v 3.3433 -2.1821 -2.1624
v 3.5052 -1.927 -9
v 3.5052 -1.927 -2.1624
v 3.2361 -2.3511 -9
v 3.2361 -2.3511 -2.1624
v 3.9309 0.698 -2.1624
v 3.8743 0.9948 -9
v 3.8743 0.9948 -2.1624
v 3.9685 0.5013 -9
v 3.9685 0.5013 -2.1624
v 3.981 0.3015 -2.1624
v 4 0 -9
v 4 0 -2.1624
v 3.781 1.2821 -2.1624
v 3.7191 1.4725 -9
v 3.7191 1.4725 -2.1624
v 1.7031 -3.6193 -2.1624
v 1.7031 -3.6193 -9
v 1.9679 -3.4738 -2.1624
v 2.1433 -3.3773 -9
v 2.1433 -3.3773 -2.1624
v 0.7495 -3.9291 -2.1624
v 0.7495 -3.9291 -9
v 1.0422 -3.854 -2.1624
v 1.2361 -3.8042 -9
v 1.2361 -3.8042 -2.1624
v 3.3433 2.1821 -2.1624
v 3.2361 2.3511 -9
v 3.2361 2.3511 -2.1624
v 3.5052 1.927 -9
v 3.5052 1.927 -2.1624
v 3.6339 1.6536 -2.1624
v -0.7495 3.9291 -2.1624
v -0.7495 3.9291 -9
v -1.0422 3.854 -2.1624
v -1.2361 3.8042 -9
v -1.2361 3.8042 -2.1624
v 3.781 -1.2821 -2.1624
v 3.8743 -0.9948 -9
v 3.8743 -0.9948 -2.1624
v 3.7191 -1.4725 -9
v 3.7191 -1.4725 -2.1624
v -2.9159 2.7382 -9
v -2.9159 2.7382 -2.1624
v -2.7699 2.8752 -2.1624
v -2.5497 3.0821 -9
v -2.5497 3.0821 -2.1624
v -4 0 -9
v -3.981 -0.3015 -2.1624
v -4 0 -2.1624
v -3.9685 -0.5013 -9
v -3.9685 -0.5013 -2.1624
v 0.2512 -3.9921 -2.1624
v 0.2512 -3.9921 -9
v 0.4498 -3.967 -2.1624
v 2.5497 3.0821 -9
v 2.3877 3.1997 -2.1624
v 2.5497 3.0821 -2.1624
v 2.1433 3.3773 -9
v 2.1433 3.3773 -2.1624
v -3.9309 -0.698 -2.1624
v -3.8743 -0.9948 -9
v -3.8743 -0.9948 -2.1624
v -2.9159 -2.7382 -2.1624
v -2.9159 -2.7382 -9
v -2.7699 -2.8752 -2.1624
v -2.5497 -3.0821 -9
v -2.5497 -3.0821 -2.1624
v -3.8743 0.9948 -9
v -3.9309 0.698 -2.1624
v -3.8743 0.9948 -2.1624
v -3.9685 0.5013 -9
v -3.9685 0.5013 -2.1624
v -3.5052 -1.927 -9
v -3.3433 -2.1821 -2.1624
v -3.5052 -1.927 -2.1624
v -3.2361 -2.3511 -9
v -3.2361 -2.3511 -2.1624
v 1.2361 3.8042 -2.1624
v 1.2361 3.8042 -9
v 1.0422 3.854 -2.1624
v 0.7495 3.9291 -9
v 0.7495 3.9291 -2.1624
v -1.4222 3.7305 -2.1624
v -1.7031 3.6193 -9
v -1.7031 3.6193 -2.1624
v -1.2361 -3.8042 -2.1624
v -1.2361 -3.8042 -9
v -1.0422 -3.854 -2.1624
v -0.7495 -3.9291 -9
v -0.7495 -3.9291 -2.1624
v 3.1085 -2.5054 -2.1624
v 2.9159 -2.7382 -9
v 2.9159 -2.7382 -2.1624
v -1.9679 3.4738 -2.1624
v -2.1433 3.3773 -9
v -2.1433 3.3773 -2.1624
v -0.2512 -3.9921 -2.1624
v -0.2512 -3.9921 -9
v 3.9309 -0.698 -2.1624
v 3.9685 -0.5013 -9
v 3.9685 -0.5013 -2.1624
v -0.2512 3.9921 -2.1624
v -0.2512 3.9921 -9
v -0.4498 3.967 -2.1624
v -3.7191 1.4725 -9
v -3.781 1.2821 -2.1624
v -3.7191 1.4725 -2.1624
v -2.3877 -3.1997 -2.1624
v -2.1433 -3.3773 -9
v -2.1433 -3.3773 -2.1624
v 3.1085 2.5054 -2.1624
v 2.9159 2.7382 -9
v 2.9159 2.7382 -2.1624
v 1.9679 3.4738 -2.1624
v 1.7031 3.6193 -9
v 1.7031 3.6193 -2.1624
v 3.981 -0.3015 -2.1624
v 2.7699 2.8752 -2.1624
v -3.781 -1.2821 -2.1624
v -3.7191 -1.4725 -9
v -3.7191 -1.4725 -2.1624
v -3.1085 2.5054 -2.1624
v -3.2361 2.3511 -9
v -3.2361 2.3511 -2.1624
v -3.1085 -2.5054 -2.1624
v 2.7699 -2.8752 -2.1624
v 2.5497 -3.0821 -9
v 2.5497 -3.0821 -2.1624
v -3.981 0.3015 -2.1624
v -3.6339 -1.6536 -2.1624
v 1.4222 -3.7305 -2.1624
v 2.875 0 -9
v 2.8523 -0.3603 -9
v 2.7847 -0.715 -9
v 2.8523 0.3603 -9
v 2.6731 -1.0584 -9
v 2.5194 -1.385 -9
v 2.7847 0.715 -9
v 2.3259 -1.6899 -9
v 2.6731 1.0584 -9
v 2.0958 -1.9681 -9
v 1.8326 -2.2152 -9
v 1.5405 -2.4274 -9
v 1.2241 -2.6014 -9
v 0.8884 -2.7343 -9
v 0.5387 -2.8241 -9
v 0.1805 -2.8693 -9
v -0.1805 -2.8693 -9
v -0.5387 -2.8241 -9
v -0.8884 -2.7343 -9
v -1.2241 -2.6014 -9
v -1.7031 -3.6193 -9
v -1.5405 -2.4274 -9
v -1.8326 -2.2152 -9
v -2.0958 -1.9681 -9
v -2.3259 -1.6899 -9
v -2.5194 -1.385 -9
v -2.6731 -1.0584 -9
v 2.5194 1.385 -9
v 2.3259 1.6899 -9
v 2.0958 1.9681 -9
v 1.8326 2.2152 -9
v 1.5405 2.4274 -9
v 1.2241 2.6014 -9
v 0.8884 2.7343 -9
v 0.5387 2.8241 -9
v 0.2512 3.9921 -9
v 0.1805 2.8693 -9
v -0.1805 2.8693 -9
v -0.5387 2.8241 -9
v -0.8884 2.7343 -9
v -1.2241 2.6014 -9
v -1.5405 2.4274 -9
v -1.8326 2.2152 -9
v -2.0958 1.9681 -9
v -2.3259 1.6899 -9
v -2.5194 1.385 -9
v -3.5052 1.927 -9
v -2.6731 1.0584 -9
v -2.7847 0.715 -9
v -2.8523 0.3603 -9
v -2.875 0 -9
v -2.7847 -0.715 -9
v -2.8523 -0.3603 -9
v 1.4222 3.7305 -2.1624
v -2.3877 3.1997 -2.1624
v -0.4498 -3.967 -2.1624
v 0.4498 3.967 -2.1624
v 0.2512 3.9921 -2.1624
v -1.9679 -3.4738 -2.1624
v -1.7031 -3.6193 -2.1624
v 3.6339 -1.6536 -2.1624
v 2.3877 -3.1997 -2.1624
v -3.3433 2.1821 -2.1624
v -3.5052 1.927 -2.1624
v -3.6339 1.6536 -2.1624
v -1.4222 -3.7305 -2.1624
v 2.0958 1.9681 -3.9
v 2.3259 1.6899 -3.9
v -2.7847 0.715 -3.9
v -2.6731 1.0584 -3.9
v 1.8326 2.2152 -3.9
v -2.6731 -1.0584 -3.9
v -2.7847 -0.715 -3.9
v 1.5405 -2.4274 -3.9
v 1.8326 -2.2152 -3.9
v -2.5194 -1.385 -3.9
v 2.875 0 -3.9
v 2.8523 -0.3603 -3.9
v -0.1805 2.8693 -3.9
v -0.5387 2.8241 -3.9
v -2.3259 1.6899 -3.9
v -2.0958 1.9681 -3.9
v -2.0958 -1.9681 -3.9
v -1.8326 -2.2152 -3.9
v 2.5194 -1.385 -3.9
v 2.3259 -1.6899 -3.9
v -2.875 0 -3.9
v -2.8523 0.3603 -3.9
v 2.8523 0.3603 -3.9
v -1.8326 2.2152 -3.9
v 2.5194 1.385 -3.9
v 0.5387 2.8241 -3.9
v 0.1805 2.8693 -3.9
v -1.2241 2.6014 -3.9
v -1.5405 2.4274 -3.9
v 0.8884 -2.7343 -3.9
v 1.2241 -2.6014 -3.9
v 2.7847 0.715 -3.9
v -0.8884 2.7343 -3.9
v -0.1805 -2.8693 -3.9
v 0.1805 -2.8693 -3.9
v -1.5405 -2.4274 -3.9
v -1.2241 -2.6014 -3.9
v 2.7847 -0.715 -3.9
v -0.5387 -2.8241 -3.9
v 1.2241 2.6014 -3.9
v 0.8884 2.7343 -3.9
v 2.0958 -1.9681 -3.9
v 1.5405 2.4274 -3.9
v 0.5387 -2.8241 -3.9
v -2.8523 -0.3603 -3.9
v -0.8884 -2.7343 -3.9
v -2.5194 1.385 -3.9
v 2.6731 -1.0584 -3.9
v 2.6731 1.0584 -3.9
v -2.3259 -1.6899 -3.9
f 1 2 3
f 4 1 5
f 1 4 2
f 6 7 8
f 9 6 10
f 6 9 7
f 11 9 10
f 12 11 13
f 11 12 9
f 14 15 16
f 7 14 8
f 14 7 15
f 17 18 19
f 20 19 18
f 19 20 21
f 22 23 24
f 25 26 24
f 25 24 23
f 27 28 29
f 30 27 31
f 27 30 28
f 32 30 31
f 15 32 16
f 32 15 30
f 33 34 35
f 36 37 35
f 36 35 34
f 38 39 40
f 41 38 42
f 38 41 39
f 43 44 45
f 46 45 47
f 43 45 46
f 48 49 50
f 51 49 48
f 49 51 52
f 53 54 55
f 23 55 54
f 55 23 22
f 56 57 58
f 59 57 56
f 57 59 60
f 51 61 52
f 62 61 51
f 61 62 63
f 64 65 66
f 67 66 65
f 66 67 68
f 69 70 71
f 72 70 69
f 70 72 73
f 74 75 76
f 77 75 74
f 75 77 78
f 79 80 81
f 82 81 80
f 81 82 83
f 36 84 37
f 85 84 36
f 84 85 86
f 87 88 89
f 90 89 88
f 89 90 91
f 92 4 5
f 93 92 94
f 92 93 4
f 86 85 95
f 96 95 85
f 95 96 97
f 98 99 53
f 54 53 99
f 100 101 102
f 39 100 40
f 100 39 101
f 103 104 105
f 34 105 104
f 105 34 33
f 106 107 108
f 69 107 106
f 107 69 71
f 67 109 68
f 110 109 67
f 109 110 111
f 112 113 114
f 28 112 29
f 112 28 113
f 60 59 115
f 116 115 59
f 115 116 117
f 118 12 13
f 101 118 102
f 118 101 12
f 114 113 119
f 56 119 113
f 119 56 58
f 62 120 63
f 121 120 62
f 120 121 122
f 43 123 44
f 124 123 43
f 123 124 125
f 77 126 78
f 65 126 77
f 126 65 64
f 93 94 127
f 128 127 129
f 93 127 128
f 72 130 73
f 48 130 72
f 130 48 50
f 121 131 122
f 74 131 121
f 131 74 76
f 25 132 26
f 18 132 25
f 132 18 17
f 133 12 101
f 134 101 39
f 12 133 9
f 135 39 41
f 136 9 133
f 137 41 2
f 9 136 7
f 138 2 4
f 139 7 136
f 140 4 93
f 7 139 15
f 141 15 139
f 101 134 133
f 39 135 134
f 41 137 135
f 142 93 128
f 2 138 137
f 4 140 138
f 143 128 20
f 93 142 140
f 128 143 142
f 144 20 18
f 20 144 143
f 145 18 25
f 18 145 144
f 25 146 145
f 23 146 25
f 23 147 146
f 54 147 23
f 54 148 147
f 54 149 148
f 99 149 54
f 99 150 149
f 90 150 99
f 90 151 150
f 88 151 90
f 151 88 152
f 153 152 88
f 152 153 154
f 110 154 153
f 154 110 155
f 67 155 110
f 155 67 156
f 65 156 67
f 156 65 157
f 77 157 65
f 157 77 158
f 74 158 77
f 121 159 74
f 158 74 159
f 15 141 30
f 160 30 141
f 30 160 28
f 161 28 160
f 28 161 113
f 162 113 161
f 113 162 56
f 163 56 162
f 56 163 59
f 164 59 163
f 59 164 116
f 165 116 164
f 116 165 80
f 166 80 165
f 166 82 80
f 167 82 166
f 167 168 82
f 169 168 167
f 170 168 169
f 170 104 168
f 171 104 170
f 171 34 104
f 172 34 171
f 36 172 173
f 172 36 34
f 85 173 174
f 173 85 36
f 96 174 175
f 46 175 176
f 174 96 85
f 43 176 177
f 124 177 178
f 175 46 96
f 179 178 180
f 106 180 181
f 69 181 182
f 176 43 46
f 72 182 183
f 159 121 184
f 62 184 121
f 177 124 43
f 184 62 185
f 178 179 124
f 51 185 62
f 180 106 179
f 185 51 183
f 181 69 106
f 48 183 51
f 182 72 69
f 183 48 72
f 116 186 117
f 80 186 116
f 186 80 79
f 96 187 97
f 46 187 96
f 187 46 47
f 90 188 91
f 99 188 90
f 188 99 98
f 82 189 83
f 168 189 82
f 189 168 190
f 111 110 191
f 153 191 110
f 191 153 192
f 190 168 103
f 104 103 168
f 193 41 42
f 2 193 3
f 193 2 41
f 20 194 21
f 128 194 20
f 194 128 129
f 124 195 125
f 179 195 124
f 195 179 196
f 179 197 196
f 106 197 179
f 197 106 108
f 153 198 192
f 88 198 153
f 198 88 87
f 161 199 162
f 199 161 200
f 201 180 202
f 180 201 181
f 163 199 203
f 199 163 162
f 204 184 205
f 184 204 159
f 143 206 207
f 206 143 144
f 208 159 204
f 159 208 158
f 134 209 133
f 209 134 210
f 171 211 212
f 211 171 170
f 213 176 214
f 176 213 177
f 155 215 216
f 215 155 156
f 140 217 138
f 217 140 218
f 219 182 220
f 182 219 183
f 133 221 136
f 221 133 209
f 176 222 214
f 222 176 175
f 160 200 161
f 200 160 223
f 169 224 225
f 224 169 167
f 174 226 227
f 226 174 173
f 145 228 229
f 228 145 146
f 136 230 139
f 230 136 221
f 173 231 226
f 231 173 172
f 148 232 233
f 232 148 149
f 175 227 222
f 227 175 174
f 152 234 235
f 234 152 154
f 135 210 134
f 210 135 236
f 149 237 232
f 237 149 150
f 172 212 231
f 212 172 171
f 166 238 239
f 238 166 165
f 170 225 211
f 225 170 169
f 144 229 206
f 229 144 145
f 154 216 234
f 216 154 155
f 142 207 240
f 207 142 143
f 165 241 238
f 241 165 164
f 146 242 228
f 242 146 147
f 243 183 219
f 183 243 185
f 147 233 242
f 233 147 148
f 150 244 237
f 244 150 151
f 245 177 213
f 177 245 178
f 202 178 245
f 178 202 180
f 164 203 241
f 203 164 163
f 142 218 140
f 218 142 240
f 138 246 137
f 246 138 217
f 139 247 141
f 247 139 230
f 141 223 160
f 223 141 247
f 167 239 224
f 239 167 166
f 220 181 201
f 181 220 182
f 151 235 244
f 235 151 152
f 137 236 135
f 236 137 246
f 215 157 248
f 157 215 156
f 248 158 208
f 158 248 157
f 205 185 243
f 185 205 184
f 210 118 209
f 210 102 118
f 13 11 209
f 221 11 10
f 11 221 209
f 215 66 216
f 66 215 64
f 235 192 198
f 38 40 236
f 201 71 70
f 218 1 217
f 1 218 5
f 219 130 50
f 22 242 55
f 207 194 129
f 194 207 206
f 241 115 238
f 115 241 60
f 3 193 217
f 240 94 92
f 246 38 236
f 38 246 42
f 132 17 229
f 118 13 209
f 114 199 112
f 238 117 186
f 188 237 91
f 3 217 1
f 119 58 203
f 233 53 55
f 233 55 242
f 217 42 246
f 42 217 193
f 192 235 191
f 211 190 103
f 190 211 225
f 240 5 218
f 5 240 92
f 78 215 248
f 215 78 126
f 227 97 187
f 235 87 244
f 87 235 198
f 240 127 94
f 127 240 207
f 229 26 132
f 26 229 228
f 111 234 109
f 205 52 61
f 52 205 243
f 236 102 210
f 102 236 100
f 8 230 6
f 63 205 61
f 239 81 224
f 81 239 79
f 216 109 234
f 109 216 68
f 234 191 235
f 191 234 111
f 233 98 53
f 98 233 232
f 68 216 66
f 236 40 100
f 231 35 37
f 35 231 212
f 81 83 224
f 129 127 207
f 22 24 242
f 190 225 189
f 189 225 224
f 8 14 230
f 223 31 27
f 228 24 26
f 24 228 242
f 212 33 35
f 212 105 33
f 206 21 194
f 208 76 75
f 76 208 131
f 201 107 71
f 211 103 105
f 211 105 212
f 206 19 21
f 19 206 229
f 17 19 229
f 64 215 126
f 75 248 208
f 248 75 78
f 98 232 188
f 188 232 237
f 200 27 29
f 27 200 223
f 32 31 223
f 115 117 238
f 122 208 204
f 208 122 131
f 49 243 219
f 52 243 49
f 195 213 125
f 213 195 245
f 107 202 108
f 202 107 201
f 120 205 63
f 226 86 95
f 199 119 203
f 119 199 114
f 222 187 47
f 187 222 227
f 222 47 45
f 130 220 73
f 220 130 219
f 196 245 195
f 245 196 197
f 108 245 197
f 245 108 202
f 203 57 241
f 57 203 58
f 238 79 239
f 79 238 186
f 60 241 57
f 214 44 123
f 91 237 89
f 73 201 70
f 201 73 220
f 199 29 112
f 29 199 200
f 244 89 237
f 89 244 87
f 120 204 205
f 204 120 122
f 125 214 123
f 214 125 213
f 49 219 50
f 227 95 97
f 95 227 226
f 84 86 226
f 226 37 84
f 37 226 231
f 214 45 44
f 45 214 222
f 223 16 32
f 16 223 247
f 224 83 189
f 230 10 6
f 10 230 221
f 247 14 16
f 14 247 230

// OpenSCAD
$fn = 50;

difference() {
	union() {
		translate(v = [0, 0, -9.0]) {
			cylinder(h = 9, r = 4.0);
		}
		#translate(v = [0, 0, -12.0]) {
			cylinder(h = 12, r = 2.875);
		}
	}
	union() {
		translate(v = [0, 0, 0]) {
			rotate(a = [0, 0, 0]) {
				difference() {
					union() {
						translate(v = [0, 0, -12.0]) {
							cylinder(h = 12, r = 2.6);
						}
						translate(v = [0, 0, -3.9]) {
							cylinder(h = 3.9, r1 = 2.875, r2 = 5.4);
						}
						translate(v = [0, 0, -12.0]) {
							cylinder(h = 12, r = 2.875);
						}
						translate(v = [0, 0, -12.0]) {
							cylinder(h = 12, r = 2.6);
						}
					}
					union();
				}
			}
		}
	}
}
